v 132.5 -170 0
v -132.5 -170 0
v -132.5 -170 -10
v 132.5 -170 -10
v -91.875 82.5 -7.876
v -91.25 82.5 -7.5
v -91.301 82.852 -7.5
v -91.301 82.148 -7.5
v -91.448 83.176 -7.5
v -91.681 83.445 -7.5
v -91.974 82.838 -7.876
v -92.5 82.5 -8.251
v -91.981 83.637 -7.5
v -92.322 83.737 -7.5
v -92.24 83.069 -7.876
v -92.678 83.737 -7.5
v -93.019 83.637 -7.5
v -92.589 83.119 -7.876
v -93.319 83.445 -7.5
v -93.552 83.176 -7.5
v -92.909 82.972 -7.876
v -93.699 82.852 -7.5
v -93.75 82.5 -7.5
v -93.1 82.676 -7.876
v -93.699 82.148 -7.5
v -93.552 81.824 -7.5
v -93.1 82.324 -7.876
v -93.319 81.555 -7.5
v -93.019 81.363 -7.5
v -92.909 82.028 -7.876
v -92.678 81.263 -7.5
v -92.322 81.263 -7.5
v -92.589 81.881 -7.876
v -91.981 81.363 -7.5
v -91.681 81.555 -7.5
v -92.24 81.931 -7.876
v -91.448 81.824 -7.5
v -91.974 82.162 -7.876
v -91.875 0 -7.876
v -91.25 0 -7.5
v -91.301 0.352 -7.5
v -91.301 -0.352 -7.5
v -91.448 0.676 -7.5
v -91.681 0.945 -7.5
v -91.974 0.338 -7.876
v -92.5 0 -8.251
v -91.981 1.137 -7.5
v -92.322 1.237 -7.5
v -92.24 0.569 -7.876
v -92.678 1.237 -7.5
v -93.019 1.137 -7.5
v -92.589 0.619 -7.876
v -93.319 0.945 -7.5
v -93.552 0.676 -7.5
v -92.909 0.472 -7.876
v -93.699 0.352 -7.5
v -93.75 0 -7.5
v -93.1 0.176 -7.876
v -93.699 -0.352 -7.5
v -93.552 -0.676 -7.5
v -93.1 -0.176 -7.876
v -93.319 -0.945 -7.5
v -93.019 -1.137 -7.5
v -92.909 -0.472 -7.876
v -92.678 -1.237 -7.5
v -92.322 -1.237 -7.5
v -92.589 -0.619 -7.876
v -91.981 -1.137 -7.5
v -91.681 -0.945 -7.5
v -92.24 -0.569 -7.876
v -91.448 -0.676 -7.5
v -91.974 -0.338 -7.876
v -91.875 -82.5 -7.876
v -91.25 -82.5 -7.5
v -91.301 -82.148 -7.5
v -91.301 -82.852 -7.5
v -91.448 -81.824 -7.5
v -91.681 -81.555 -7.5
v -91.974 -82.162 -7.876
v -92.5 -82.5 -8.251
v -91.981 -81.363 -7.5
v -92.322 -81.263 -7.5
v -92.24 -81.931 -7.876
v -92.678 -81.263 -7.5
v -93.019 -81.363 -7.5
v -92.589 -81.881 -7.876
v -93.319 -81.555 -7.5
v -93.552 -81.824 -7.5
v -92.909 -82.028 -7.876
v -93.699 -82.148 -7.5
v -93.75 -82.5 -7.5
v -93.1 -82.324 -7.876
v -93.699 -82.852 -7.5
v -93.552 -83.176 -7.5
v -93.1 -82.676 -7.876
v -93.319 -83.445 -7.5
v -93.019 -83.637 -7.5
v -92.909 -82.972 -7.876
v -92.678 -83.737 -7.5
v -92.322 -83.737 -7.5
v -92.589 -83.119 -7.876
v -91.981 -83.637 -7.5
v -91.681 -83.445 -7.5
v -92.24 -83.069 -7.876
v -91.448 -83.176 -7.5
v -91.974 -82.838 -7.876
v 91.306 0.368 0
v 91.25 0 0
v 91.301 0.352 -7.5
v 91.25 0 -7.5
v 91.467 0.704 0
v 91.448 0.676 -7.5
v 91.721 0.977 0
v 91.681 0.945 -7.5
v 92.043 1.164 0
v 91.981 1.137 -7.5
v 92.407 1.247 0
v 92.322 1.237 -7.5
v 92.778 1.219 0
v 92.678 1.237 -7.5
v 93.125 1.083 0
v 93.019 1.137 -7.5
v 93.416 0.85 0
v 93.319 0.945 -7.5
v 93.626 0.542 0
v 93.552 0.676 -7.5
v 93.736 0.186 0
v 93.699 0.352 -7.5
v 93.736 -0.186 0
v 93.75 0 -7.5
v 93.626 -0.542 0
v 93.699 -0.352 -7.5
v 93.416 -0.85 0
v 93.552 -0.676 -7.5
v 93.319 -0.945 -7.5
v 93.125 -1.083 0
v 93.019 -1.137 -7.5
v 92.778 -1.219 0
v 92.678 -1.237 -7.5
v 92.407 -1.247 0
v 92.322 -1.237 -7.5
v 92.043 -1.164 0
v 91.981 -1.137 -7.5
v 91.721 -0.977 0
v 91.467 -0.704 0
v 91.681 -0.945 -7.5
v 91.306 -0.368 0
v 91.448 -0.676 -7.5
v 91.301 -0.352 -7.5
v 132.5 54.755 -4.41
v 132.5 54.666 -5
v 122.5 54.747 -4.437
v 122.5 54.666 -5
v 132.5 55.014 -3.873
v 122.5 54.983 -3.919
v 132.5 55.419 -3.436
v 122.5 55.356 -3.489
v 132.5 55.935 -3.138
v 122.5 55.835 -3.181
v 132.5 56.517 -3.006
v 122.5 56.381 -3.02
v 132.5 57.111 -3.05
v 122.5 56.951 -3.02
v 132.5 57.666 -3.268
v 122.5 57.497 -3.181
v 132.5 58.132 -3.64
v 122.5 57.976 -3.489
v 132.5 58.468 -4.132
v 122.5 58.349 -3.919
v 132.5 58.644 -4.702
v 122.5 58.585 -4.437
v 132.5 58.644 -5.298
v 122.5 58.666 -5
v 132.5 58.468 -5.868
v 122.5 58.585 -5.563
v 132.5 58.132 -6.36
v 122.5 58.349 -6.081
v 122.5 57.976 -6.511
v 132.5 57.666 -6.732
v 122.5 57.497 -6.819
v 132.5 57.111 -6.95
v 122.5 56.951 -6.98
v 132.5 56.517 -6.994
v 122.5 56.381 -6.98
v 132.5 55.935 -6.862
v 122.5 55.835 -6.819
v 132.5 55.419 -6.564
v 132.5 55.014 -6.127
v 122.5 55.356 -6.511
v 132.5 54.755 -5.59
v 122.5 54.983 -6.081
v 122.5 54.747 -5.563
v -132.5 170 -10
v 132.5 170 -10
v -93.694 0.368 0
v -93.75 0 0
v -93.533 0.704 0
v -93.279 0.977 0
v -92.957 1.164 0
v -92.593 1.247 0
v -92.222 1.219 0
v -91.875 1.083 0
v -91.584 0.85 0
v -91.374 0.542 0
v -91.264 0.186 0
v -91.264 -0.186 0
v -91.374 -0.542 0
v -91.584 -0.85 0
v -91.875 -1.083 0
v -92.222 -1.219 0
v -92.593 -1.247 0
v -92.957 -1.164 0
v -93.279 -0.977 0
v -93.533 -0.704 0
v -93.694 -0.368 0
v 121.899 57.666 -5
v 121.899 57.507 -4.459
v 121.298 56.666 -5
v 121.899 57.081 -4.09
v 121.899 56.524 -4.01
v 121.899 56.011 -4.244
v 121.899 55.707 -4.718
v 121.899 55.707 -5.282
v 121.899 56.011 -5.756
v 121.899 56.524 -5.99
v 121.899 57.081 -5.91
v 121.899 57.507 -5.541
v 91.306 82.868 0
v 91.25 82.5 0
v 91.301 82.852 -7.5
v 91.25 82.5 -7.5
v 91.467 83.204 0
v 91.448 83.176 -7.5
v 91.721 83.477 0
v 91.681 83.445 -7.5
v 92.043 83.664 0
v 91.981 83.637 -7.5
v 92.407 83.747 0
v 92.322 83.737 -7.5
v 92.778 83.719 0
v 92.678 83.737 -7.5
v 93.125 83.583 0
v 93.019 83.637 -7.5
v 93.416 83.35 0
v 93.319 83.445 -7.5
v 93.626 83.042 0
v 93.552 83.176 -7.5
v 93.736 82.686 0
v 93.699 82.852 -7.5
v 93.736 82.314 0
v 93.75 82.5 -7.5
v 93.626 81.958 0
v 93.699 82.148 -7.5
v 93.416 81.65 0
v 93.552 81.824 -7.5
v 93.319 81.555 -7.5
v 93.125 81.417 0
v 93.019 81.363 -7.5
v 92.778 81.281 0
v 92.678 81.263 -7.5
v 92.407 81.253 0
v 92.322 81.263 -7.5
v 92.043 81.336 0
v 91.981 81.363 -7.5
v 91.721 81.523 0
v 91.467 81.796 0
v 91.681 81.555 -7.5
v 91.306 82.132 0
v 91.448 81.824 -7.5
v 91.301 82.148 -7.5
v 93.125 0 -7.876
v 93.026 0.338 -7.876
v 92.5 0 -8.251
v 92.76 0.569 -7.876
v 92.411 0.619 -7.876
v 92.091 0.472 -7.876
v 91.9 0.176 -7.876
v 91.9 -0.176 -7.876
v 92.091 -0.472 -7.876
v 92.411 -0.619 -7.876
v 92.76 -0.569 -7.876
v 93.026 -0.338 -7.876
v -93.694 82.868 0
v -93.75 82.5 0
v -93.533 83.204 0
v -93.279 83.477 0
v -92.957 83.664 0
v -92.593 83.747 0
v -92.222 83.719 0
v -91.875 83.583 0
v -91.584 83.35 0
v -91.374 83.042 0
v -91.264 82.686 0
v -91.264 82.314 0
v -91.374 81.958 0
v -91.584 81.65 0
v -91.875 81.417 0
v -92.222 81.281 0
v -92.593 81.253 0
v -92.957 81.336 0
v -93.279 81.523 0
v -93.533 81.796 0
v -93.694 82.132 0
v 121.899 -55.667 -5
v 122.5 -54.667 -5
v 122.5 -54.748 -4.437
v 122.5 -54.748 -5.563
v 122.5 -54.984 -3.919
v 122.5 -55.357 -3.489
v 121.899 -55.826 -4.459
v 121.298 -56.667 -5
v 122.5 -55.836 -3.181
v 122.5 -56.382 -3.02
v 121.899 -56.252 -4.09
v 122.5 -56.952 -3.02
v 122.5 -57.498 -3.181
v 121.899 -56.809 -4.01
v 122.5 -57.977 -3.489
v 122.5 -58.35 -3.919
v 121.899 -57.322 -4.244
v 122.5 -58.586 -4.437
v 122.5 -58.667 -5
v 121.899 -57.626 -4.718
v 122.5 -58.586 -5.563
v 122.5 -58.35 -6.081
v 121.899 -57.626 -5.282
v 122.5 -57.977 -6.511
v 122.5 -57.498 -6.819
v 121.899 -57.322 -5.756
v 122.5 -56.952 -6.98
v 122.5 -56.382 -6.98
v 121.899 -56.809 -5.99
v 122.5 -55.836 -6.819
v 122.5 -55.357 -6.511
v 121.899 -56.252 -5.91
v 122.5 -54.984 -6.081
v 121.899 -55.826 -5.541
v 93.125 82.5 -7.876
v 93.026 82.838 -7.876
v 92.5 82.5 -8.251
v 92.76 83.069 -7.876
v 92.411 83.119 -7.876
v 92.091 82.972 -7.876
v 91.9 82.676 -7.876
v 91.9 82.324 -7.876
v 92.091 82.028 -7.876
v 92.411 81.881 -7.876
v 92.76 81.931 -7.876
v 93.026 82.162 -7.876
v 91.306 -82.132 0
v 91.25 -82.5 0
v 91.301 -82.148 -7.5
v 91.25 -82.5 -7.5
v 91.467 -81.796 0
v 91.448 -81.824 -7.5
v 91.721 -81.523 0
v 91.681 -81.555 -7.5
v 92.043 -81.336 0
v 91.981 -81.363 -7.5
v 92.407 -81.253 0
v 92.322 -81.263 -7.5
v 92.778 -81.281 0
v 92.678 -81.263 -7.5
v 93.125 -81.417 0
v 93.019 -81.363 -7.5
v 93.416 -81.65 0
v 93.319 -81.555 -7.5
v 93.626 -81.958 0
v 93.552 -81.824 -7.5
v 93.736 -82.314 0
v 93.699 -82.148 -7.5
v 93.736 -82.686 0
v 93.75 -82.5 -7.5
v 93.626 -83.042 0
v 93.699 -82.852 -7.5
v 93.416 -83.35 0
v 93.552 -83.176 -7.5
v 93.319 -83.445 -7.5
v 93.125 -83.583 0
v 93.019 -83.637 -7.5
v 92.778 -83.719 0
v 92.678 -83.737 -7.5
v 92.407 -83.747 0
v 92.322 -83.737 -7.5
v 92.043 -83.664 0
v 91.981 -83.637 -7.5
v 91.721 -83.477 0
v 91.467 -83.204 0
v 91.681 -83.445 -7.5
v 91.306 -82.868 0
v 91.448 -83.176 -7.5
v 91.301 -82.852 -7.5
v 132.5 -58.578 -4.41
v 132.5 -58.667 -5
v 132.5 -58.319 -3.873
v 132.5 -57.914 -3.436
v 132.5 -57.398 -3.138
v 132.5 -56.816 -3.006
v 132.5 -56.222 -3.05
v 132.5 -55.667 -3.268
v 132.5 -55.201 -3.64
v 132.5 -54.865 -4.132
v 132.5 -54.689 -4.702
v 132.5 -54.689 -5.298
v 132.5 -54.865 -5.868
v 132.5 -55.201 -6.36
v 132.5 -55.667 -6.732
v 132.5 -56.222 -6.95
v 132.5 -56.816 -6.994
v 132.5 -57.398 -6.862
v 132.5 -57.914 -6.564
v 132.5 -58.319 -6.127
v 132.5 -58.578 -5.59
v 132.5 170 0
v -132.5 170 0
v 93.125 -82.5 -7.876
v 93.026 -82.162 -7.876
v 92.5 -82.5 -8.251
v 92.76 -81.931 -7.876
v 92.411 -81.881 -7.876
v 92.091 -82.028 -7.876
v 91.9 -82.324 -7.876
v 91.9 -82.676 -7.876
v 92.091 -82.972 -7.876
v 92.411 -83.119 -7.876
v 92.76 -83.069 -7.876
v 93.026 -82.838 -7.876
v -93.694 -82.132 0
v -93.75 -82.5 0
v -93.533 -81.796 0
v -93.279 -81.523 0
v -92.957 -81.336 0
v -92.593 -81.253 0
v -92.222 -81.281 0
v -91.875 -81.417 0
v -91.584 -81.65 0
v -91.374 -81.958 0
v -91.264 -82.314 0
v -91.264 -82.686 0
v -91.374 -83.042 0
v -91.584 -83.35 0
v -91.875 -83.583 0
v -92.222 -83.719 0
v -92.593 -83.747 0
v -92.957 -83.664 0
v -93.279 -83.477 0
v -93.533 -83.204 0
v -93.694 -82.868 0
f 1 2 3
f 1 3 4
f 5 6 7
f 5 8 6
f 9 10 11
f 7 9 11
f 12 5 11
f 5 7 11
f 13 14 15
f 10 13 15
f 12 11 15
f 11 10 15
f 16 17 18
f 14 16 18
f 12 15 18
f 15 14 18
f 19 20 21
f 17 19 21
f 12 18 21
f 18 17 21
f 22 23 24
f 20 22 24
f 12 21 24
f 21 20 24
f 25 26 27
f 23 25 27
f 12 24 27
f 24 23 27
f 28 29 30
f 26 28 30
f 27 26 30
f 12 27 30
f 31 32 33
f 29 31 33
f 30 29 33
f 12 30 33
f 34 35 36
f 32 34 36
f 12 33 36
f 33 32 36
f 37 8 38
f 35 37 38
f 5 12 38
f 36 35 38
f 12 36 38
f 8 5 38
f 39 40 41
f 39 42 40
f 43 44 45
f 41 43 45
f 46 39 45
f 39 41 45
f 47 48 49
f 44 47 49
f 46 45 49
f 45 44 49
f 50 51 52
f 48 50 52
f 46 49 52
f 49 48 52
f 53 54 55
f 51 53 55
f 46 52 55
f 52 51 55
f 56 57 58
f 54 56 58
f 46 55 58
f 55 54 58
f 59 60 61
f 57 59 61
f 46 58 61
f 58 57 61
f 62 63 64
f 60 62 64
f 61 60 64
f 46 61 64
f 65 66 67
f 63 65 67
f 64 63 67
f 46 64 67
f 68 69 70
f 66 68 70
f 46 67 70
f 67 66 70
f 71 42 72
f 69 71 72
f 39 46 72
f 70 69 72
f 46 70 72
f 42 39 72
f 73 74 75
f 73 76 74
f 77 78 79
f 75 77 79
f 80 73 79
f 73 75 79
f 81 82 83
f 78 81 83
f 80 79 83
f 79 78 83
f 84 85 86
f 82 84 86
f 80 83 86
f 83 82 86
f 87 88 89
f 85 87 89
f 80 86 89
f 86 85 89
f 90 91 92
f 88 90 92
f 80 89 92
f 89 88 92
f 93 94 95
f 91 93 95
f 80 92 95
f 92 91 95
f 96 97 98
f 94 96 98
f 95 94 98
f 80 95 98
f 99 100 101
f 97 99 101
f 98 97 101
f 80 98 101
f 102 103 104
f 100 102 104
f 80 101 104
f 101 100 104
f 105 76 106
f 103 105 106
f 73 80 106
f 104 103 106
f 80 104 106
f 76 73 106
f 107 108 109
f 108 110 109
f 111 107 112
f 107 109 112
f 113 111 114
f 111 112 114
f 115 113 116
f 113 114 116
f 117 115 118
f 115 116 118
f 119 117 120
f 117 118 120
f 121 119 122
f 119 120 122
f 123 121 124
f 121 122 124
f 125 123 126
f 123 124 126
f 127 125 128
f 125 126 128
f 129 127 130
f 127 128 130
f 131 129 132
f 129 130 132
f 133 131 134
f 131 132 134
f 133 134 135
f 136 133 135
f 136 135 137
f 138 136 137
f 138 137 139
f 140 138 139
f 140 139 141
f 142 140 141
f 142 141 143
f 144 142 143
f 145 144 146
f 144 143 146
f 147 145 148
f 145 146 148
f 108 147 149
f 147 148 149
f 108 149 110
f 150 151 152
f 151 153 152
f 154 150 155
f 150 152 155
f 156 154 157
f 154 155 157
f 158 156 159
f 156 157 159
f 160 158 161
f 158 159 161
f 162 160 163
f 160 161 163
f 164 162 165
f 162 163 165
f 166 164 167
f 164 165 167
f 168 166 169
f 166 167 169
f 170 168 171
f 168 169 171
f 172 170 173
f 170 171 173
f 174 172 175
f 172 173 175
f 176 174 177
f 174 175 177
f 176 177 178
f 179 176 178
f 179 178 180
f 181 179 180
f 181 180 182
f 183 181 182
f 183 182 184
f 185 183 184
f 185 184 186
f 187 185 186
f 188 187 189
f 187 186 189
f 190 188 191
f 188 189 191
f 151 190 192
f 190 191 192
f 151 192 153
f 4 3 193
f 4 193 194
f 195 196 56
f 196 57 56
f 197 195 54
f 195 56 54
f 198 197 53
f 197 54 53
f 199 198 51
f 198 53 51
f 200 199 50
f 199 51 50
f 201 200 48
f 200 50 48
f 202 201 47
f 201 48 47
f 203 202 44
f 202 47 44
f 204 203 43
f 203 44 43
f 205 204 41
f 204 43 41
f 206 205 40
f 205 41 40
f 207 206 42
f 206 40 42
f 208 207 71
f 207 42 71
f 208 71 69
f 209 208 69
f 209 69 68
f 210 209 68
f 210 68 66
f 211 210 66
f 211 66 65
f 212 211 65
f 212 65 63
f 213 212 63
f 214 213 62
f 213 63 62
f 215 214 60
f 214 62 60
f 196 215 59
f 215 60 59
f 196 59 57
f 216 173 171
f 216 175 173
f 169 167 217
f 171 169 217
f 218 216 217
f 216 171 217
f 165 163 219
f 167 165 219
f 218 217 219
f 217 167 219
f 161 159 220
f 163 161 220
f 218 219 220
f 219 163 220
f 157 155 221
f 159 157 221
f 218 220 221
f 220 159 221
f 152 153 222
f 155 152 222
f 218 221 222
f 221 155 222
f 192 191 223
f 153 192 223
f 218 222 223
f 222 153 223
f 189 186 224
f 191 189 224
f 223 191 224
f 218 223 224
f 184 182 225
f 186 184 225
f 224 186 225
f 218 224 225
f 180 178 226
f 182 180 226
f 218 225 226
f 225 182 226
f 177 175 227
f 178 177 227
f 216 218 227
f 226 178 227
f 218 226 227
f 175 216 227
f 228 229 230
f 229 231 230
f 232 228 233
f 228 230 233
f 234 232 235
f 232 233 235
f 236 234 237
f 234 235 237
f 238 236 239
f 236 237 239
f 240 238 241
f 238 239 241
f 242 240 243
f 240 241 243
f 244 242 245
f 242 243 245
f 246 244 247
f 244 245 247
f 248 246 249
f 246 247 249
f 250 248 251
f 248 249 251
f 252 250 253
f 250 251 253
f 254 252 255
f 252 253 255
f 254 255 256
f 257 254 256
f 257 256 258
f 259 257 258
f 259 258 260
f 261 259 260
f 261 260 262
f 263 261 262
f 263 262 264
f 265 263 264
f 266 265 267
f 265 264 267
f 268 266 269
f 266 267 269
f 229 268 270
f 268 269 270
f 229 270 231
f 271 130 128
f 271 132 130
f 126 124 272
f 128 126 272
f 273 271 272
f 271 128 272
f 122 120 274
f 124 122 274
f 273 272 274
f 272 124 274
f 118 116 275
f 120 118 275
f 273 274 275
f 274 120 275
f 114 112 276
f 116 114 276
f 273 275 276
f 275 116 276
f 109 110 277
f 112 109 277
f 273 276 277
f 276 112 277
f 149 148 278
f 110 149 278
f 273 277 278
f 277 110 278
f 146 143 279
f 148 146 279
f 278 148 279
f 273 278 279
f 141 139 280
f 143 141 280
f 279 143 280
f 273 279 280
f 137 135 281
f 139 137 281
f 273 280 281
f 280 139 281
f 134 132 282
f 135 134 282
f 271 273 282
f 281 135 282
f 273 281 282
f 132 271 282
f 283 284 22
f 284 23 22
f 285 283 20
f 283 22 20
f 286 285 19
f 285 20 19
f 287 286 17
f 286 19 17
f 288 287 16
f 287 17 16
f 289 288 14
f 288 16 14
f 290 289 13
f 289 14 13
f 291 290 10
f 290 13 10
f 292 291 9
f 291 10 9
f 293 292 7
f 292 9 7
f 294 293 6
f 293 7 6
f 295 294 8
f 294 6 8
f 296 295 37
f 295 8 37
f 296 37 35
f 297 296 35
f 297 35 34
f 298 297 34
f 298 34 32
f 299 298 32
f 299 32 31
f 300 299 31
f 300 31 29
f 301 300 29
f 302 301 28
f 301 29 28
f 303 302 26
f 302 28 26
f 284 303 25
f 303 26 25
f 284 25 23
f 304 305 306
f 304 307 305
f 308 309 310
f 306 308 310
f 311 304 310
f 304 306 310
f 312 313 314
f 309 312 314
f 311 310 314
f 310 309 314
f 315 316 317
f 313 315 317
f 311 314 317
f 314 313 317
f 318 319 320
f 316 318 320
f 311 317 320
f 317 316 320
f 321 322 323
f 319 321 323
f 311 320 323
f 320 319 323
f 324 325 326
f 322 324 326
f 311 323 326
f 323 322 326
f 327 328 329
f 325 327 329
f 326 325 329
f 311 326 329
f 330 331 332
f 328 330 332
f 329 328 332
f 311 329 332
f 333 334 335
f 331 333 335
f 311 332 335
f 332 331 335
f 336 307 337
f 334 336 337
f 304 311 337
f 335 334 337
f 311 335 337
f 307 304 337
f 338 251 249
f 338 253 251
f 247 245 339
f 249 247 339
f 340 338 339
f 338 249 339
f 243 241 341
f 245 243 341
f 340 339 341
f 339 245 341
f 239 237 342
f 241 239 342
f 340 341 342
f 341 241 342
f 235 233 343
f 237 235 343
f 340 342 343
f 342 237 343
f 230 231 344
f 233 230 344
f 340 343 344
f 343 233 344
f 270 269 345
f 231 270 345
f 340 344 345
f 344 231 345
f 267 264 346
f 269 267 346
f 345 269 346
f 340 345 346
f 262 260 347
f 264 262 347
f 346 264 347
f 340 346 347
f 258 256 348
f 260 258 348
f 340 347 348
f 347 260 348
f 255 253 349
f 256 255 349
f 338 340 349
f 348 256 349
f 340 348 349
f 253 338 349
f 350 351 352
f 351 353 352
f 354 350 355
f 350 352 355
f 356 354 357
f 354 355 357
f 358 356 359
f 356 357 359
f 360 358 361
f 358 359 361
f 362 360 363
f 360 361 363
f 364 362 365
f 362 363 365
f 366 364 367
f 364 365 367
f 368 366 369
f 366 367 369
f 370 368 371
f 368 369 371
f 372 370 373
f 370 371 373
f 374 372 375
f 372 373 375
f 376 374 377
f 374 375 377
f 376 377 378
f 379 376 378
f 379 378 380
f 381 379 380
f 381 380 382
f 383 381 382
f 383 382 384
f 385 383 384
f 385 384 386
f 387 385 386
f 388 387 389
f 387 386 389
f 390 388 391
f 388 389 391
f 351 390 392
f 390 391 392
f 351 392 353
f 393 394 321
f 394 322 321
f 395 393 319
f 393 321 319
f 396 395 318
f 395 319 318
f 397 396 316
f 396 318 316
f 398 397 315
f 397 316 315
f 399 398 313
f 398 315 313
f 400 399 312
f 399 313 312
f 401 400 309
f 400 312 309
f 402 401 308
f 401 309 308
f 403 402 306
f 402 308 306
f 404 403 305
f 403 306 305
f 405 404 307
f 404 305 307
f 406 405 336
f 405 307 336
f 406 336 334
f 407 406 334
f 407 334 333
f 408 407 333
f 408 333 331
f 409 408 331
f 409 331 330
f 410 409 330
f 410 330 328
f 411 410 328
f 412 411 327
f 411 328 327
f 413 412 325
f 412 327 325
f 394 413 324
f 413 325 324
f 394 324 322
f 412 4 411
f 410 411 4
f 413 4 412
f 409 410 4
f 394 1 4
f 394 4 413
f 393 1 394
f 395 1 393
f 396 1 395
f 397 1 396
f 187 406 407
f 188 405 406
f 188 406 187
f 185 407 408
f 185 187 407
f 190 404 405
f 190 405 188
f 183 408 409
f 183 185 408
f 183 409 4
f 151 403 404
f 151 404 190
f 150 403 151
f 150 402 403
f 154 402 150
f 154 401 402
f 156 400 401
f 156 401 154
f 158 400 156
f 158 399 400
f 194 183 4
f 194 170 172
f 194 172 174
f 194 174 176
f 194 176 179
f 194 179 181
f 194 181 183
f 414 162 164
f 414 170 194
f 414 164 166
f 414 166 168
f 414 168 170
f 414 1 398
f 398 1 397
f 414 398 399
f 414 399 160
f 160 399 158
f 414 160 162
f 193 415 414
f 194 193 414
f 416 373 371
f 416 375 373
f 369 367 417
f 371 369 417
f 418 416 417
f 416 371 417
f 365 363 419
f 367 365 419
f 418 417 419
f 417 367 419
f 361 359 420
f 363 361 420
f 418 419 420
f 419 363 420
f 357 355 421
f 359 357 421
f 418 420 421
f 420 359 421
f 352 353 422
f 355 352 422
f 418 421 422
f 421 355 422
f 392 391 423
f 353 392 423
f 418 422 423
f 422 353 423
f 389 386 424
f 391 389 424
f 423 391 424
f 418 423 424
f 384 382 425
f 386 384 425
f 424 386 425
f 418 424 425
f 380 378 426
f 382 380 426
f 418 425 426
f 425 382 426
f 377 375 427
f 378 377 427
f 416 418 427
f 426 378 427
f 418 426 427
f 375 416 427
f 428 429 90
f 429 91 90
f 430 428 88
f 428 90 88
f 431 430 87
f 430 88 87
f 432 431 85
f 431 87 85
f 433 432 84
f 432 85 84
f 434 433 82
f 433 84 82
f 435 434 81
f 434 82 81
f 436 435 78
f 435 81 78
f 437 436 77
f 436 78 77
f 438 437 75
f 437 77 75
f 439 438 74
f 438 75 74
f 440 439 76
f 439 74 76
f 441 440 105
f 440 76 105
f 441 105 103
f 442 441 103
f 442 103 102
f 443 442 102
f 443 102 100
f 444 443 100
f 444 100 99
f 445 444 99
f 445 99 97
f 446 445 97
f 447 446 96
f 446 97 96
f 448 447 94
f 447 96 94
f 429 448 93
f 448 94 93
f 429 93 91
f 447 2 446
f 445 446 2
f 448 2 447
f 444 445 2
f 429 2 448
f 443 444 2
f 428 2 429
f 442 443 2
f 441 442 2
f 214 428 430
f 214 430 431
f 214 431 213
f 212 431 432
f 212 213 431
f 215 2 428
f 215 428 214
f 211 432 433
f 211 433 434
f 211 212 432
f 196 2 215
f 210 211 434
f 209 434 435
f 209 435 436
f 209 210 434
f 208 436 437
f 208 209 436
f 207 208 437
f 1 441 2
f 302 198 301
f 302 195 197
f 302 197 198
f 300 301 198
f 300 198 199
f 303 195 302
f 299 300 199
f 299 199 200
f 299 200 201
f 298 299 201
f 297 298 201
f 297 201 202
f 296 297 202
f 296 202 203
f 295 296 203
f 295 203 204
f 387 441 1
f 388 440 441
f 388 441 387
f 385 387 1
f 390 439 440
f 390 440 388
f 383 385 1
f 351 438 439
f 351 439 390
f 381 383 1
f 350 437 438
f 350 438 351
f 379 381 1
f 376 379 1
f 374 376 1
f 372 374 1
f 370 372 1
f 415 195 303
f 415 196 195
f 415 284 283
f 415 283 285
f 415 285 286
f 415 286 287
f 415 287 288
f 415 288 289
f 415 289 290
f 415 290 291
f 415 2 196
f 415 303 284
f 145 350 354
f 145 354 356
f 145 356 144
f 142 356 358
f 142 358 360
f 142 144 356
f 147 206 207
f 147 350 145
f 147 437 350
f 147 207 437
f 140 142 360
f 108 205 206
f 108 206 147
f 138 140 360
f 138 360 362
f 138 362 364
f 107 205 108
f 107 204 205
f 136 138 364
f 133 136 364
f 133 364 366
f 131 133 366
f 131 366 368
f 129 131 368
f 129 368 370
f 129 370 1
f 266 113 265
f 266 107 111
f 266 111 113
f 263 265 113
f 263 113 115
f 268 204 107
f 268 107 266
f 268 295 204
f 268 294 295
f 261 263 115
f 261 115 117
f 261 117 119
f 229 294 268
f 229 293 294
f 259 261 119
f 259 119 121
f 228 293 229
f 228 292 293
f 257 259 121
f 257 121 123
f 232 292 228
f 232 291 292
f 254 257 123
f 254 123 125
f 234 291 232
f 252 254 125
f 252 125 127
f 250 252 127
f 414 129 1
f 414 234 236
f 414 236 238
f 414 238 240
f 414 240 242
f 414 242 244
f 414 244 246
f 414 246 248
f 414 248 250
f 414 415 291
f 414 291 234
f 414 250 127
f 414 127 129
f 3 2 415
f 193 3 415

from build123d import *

# Parameters (mm, degrees)
F0_W     = 265
F0_H     = 340
F1_DEPTH = 10
F3_D     = 2.5
F3_DEPTH = 7.5
F3_TIP   = 0.7510757738
F5_D     = 4
F5_DEPTH = 10
F5_TIP   = 1.2017212381


with BuildPart() as f1:
    # F0 (on Top) → F1 (new body)
    with BuildSketch(Plane.XY):
        Rectangle(F0_W, F0_H)
    extrude(amount=-F1_DEPTH)

    # F3
    with Locations(Plane.XY):
        with Locations((-92.5, 82.5), (-92.5, 0), (-92.5, -82.5), (92.5, -82.5), (92.5, 0), (92.5, 82.5)):
            Hole(F3_D / 2, depth=F3_DEPTH)
            with Locations((0, 0, -(F3_DEPTH + F3_TIP / 2))):  # 118° drill point
                Cone(0, F3_D / 2, F3_TIP, mode=Mode.SUBTRACT)

    # F5
    with Locations(Plane.YZ.offset(132.5)):
        with Locations((-56.667, -5), (56.666, -5)):
            Hole(F5_D / 2, depth=F5_DEPTH)
            with Locations((0, 0, -(F5_DEPTH + F5_TIP / 2))):  # 118° drill point
                Cone(0, F5_D / 2, F5_TIP, mode=Mode.SUBTRACT)


solid = f1.part
